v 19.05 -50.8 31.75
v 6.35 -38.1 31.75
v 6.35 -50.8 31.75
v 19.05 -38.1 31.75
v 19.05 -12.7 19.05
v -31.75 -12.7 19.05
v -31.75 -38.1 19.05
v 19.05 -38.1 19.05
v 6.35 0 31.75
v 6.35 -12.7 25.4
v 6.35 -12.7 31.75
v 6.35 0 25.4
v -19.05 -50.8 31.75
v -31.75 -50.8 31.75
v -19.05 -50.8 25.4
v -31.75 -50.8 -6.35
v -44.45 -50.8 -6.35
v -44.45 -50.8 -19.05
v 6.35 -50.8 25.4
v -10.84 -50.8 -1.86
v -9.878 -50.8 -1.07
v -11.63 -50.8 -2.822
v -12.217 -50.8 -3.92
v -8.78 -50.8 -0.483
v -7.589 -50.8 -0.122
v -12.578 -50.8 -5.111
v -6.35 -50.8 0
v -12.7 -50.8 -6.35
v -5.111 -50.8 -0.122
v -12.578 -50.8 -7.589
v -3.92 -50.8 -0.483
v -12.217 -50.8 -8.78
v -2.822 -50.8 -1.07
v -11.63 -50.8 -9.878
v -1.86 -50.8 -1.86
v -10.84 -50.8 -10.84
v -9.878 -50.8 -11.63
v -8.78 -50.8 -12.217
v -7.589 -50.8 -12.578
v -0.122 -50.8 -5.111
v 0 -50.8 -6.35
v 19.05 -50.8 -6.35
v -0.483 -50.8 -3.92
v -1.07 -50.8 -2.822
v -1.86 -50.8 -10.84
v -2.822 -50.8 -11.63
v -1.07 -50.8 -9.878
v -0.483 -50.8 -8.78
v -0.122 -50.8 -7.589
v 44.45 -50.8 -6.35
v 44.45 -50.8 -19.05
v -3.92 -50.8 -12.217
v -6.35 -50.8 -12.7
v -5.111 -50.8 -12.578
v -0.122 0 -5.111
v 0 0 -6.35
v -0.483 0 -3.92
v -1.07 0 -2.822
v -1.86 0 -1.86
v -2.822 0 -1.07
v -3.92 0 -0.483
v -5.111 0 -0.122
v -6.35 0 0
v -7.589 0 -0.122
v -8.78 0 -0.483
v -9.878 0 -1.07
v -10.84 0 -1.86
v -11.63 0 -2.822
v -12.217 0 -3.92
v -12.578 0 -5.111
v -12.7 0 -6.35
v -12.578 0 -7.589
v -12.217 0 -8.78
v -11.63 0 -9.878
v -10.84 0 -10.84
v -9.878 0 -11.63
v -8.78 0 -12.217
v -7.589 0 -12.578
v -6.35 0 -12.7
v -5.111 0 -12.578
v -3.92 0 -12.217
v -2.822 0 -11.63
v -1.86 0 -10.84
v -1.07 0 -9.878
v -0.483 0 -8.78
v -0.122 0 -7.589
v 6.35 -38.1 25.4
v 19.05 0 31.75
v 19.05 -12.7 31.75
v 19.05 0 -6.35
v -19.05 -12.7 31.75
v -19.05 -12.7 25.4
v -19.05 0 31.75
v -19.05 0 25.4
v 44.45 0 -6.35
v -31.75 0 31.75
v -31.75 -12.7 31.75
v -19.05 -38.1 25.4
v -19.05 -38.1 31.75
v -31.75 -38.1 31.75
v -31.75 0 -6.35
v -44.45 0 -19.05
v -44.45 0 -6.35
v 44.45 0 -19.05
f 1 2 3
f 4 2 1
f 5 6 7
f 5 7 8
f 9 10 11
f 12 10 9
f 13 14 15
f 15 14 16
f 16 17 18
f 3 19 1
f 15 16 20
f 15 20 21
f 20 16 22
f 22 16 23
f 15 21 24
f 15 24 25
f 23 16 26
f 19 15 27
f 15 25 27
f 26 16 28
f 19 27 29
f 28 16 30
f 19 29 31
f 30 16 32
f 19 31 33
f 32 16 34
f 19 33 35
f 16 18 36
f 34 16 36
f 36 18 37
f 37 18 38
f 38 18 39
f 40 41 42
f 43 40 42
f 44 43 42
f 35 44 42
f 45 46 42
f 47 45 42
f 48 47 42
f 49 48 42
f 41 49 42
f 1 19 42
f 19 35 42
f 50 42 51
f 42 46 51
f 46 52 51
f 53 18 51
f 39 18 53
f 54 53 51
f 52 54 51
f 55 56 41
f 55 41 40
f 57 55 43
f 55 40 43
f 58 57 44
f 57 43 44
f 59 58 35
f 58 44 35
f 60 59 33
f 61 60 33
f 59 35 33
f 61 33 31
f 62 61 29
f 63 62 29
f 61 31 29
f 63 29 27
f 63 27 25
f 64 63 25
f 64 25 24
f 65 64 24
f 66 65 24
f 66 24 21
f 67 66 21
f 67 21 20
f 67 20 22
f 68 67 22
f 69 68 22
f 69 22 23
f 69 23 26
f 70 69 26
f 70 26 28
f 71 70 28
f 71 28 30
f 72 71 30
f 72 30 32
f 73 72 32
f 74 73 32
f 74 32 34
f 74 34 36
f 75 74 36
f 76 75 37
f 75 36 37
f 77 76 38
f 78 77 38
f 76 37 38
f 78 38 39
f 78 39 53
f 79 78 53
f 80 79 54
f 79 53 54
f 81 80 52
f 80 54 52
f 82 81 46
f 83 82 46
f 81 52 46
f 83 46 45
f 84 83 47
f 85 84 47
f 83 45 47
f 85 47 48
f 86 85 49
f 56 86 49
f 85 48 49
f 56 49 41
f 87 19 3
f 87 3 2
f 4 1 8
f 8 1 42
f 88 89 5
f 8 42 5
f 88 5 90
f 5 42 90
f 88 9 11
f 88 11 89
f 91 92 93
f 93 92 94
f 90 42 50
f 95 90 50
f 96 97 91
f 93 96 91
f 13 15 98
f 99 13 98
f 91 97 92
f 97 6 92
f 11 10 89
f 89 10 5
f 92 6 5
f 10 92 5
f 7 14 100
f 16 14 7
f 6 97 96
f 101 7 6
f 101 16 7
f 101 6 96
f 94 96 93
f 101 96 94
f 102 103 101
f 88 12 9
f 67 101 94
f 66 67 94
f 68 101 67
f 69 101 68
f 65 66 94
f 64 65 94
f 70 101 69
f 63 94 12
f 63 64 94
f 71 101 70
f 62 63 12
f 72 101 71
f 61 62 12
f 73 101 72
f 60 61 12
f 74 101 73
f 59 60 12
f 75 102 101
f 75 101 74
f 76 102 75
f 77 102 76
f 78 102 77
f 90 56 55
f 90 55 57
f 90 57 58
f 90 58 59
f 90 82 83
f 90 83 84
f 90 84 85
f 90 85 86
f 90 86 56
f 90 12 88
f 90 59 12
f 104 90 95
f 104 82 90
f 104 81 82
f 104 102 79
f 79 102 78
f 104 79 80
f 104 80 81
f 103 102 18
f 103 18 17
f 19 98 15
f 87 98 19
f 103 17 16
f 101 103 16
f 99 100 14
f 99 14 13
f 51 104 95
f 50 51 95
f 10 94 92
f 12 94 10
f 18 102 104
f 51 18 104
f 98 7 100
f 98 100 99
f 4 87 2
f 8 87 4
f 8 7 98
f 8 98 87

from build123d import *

# Parameters (mm, degrees)
F0_W      = 88.9
F0_H      = 38.1
F1_DEPTH  = 50.8
F2_W      = 12.7
F2_H      = 25.4
F3_DEPTH  = 50.801
F4_W      = 25.4
F4_H      = 25.4
F5_DEPTH  = 50.801
F6_W      = 50.8
F6_H      = 12.7
F7_DEPTH  = 6.35
F8_W      = 12.7
F8_H      = 12.7
F9_DEPTH  = 6.35
F10_W     = 12.7
F10_H     = 12.7
F11_DEPTH = 6.35
F12_R     = 6.35
F13_DEPTH = 50.801


with BuildPart() as f1:
    # F0 (on Front) → F1 (new body)
    with BuildSketch(Plane.XZ):
        Rectangle(F0_W, F0_H)
    extrude(amount=F1_DEPTH)

    # F2 (on face) → F3 (cut, through all)
    with BuildSketch(Plane.XZ.offset(50.8)):
        with Locations((-38.1, 6.35)):
            Rectangle(F2_W, F2_H)
    extrude(amount=-F3_DEPTH, mode=Mode.SUBTRACT)

    # F4 (on face) → F5 (cut, through all)
    with BuildSketch(Plane.XZ.offset(50.8)):
        with Locations((31.75, 6.35)):
            Rectangle(F4_W, F4_H)
    extrude(amount=-F5_DEPTH, mode=Mode.SUBTRACT)

    # F6 (on face) → F7 (join)
    with BuildSketch(Plane.XY.offset(19.05)):
        with Locations((-6.35, -6.35)):
            Rectangle(F6_W, F6_H)
        with Locations((-6.35, -44.45)):
            Rectangle(F6_W, F6_H)
    extrude(amount=F7_DEPTH)

    # F8 (on face) → F9 (join)
    with BuildSketch(Plane.XY.offset(25.4)):
        with Locations((-25.4, -6.35)):
            Rectangle(F8_W, F8_H)
        with Locations((12.7, -6.35)):
            Rectangle(F8_W, F8_H)
    extrude(amount=F9_DEPTH)

    # F10 (on face) → F11 (join)
    with BuildSketch(Plane.XY.offset(25.4)):
        with Locations((-25.4, -44.45)):
            Rectangle(F10_W, F10_H)
        with Locations((12.7, -44.45)):
            Rectangle(F10_W, F10_H)
    extrude(amount=F11_DEPTH)

    # F12 (on face) → F13 (cut, through all)
    with BuildSketch(Plane.XZ.offset(50.8)):
        with Locations((-6.35, -6.35)):
            Circle(F12_R)
    extrude(amount=-F13_DEPTH, mode=Mode.SUBTRACT)


solid = f1.part
